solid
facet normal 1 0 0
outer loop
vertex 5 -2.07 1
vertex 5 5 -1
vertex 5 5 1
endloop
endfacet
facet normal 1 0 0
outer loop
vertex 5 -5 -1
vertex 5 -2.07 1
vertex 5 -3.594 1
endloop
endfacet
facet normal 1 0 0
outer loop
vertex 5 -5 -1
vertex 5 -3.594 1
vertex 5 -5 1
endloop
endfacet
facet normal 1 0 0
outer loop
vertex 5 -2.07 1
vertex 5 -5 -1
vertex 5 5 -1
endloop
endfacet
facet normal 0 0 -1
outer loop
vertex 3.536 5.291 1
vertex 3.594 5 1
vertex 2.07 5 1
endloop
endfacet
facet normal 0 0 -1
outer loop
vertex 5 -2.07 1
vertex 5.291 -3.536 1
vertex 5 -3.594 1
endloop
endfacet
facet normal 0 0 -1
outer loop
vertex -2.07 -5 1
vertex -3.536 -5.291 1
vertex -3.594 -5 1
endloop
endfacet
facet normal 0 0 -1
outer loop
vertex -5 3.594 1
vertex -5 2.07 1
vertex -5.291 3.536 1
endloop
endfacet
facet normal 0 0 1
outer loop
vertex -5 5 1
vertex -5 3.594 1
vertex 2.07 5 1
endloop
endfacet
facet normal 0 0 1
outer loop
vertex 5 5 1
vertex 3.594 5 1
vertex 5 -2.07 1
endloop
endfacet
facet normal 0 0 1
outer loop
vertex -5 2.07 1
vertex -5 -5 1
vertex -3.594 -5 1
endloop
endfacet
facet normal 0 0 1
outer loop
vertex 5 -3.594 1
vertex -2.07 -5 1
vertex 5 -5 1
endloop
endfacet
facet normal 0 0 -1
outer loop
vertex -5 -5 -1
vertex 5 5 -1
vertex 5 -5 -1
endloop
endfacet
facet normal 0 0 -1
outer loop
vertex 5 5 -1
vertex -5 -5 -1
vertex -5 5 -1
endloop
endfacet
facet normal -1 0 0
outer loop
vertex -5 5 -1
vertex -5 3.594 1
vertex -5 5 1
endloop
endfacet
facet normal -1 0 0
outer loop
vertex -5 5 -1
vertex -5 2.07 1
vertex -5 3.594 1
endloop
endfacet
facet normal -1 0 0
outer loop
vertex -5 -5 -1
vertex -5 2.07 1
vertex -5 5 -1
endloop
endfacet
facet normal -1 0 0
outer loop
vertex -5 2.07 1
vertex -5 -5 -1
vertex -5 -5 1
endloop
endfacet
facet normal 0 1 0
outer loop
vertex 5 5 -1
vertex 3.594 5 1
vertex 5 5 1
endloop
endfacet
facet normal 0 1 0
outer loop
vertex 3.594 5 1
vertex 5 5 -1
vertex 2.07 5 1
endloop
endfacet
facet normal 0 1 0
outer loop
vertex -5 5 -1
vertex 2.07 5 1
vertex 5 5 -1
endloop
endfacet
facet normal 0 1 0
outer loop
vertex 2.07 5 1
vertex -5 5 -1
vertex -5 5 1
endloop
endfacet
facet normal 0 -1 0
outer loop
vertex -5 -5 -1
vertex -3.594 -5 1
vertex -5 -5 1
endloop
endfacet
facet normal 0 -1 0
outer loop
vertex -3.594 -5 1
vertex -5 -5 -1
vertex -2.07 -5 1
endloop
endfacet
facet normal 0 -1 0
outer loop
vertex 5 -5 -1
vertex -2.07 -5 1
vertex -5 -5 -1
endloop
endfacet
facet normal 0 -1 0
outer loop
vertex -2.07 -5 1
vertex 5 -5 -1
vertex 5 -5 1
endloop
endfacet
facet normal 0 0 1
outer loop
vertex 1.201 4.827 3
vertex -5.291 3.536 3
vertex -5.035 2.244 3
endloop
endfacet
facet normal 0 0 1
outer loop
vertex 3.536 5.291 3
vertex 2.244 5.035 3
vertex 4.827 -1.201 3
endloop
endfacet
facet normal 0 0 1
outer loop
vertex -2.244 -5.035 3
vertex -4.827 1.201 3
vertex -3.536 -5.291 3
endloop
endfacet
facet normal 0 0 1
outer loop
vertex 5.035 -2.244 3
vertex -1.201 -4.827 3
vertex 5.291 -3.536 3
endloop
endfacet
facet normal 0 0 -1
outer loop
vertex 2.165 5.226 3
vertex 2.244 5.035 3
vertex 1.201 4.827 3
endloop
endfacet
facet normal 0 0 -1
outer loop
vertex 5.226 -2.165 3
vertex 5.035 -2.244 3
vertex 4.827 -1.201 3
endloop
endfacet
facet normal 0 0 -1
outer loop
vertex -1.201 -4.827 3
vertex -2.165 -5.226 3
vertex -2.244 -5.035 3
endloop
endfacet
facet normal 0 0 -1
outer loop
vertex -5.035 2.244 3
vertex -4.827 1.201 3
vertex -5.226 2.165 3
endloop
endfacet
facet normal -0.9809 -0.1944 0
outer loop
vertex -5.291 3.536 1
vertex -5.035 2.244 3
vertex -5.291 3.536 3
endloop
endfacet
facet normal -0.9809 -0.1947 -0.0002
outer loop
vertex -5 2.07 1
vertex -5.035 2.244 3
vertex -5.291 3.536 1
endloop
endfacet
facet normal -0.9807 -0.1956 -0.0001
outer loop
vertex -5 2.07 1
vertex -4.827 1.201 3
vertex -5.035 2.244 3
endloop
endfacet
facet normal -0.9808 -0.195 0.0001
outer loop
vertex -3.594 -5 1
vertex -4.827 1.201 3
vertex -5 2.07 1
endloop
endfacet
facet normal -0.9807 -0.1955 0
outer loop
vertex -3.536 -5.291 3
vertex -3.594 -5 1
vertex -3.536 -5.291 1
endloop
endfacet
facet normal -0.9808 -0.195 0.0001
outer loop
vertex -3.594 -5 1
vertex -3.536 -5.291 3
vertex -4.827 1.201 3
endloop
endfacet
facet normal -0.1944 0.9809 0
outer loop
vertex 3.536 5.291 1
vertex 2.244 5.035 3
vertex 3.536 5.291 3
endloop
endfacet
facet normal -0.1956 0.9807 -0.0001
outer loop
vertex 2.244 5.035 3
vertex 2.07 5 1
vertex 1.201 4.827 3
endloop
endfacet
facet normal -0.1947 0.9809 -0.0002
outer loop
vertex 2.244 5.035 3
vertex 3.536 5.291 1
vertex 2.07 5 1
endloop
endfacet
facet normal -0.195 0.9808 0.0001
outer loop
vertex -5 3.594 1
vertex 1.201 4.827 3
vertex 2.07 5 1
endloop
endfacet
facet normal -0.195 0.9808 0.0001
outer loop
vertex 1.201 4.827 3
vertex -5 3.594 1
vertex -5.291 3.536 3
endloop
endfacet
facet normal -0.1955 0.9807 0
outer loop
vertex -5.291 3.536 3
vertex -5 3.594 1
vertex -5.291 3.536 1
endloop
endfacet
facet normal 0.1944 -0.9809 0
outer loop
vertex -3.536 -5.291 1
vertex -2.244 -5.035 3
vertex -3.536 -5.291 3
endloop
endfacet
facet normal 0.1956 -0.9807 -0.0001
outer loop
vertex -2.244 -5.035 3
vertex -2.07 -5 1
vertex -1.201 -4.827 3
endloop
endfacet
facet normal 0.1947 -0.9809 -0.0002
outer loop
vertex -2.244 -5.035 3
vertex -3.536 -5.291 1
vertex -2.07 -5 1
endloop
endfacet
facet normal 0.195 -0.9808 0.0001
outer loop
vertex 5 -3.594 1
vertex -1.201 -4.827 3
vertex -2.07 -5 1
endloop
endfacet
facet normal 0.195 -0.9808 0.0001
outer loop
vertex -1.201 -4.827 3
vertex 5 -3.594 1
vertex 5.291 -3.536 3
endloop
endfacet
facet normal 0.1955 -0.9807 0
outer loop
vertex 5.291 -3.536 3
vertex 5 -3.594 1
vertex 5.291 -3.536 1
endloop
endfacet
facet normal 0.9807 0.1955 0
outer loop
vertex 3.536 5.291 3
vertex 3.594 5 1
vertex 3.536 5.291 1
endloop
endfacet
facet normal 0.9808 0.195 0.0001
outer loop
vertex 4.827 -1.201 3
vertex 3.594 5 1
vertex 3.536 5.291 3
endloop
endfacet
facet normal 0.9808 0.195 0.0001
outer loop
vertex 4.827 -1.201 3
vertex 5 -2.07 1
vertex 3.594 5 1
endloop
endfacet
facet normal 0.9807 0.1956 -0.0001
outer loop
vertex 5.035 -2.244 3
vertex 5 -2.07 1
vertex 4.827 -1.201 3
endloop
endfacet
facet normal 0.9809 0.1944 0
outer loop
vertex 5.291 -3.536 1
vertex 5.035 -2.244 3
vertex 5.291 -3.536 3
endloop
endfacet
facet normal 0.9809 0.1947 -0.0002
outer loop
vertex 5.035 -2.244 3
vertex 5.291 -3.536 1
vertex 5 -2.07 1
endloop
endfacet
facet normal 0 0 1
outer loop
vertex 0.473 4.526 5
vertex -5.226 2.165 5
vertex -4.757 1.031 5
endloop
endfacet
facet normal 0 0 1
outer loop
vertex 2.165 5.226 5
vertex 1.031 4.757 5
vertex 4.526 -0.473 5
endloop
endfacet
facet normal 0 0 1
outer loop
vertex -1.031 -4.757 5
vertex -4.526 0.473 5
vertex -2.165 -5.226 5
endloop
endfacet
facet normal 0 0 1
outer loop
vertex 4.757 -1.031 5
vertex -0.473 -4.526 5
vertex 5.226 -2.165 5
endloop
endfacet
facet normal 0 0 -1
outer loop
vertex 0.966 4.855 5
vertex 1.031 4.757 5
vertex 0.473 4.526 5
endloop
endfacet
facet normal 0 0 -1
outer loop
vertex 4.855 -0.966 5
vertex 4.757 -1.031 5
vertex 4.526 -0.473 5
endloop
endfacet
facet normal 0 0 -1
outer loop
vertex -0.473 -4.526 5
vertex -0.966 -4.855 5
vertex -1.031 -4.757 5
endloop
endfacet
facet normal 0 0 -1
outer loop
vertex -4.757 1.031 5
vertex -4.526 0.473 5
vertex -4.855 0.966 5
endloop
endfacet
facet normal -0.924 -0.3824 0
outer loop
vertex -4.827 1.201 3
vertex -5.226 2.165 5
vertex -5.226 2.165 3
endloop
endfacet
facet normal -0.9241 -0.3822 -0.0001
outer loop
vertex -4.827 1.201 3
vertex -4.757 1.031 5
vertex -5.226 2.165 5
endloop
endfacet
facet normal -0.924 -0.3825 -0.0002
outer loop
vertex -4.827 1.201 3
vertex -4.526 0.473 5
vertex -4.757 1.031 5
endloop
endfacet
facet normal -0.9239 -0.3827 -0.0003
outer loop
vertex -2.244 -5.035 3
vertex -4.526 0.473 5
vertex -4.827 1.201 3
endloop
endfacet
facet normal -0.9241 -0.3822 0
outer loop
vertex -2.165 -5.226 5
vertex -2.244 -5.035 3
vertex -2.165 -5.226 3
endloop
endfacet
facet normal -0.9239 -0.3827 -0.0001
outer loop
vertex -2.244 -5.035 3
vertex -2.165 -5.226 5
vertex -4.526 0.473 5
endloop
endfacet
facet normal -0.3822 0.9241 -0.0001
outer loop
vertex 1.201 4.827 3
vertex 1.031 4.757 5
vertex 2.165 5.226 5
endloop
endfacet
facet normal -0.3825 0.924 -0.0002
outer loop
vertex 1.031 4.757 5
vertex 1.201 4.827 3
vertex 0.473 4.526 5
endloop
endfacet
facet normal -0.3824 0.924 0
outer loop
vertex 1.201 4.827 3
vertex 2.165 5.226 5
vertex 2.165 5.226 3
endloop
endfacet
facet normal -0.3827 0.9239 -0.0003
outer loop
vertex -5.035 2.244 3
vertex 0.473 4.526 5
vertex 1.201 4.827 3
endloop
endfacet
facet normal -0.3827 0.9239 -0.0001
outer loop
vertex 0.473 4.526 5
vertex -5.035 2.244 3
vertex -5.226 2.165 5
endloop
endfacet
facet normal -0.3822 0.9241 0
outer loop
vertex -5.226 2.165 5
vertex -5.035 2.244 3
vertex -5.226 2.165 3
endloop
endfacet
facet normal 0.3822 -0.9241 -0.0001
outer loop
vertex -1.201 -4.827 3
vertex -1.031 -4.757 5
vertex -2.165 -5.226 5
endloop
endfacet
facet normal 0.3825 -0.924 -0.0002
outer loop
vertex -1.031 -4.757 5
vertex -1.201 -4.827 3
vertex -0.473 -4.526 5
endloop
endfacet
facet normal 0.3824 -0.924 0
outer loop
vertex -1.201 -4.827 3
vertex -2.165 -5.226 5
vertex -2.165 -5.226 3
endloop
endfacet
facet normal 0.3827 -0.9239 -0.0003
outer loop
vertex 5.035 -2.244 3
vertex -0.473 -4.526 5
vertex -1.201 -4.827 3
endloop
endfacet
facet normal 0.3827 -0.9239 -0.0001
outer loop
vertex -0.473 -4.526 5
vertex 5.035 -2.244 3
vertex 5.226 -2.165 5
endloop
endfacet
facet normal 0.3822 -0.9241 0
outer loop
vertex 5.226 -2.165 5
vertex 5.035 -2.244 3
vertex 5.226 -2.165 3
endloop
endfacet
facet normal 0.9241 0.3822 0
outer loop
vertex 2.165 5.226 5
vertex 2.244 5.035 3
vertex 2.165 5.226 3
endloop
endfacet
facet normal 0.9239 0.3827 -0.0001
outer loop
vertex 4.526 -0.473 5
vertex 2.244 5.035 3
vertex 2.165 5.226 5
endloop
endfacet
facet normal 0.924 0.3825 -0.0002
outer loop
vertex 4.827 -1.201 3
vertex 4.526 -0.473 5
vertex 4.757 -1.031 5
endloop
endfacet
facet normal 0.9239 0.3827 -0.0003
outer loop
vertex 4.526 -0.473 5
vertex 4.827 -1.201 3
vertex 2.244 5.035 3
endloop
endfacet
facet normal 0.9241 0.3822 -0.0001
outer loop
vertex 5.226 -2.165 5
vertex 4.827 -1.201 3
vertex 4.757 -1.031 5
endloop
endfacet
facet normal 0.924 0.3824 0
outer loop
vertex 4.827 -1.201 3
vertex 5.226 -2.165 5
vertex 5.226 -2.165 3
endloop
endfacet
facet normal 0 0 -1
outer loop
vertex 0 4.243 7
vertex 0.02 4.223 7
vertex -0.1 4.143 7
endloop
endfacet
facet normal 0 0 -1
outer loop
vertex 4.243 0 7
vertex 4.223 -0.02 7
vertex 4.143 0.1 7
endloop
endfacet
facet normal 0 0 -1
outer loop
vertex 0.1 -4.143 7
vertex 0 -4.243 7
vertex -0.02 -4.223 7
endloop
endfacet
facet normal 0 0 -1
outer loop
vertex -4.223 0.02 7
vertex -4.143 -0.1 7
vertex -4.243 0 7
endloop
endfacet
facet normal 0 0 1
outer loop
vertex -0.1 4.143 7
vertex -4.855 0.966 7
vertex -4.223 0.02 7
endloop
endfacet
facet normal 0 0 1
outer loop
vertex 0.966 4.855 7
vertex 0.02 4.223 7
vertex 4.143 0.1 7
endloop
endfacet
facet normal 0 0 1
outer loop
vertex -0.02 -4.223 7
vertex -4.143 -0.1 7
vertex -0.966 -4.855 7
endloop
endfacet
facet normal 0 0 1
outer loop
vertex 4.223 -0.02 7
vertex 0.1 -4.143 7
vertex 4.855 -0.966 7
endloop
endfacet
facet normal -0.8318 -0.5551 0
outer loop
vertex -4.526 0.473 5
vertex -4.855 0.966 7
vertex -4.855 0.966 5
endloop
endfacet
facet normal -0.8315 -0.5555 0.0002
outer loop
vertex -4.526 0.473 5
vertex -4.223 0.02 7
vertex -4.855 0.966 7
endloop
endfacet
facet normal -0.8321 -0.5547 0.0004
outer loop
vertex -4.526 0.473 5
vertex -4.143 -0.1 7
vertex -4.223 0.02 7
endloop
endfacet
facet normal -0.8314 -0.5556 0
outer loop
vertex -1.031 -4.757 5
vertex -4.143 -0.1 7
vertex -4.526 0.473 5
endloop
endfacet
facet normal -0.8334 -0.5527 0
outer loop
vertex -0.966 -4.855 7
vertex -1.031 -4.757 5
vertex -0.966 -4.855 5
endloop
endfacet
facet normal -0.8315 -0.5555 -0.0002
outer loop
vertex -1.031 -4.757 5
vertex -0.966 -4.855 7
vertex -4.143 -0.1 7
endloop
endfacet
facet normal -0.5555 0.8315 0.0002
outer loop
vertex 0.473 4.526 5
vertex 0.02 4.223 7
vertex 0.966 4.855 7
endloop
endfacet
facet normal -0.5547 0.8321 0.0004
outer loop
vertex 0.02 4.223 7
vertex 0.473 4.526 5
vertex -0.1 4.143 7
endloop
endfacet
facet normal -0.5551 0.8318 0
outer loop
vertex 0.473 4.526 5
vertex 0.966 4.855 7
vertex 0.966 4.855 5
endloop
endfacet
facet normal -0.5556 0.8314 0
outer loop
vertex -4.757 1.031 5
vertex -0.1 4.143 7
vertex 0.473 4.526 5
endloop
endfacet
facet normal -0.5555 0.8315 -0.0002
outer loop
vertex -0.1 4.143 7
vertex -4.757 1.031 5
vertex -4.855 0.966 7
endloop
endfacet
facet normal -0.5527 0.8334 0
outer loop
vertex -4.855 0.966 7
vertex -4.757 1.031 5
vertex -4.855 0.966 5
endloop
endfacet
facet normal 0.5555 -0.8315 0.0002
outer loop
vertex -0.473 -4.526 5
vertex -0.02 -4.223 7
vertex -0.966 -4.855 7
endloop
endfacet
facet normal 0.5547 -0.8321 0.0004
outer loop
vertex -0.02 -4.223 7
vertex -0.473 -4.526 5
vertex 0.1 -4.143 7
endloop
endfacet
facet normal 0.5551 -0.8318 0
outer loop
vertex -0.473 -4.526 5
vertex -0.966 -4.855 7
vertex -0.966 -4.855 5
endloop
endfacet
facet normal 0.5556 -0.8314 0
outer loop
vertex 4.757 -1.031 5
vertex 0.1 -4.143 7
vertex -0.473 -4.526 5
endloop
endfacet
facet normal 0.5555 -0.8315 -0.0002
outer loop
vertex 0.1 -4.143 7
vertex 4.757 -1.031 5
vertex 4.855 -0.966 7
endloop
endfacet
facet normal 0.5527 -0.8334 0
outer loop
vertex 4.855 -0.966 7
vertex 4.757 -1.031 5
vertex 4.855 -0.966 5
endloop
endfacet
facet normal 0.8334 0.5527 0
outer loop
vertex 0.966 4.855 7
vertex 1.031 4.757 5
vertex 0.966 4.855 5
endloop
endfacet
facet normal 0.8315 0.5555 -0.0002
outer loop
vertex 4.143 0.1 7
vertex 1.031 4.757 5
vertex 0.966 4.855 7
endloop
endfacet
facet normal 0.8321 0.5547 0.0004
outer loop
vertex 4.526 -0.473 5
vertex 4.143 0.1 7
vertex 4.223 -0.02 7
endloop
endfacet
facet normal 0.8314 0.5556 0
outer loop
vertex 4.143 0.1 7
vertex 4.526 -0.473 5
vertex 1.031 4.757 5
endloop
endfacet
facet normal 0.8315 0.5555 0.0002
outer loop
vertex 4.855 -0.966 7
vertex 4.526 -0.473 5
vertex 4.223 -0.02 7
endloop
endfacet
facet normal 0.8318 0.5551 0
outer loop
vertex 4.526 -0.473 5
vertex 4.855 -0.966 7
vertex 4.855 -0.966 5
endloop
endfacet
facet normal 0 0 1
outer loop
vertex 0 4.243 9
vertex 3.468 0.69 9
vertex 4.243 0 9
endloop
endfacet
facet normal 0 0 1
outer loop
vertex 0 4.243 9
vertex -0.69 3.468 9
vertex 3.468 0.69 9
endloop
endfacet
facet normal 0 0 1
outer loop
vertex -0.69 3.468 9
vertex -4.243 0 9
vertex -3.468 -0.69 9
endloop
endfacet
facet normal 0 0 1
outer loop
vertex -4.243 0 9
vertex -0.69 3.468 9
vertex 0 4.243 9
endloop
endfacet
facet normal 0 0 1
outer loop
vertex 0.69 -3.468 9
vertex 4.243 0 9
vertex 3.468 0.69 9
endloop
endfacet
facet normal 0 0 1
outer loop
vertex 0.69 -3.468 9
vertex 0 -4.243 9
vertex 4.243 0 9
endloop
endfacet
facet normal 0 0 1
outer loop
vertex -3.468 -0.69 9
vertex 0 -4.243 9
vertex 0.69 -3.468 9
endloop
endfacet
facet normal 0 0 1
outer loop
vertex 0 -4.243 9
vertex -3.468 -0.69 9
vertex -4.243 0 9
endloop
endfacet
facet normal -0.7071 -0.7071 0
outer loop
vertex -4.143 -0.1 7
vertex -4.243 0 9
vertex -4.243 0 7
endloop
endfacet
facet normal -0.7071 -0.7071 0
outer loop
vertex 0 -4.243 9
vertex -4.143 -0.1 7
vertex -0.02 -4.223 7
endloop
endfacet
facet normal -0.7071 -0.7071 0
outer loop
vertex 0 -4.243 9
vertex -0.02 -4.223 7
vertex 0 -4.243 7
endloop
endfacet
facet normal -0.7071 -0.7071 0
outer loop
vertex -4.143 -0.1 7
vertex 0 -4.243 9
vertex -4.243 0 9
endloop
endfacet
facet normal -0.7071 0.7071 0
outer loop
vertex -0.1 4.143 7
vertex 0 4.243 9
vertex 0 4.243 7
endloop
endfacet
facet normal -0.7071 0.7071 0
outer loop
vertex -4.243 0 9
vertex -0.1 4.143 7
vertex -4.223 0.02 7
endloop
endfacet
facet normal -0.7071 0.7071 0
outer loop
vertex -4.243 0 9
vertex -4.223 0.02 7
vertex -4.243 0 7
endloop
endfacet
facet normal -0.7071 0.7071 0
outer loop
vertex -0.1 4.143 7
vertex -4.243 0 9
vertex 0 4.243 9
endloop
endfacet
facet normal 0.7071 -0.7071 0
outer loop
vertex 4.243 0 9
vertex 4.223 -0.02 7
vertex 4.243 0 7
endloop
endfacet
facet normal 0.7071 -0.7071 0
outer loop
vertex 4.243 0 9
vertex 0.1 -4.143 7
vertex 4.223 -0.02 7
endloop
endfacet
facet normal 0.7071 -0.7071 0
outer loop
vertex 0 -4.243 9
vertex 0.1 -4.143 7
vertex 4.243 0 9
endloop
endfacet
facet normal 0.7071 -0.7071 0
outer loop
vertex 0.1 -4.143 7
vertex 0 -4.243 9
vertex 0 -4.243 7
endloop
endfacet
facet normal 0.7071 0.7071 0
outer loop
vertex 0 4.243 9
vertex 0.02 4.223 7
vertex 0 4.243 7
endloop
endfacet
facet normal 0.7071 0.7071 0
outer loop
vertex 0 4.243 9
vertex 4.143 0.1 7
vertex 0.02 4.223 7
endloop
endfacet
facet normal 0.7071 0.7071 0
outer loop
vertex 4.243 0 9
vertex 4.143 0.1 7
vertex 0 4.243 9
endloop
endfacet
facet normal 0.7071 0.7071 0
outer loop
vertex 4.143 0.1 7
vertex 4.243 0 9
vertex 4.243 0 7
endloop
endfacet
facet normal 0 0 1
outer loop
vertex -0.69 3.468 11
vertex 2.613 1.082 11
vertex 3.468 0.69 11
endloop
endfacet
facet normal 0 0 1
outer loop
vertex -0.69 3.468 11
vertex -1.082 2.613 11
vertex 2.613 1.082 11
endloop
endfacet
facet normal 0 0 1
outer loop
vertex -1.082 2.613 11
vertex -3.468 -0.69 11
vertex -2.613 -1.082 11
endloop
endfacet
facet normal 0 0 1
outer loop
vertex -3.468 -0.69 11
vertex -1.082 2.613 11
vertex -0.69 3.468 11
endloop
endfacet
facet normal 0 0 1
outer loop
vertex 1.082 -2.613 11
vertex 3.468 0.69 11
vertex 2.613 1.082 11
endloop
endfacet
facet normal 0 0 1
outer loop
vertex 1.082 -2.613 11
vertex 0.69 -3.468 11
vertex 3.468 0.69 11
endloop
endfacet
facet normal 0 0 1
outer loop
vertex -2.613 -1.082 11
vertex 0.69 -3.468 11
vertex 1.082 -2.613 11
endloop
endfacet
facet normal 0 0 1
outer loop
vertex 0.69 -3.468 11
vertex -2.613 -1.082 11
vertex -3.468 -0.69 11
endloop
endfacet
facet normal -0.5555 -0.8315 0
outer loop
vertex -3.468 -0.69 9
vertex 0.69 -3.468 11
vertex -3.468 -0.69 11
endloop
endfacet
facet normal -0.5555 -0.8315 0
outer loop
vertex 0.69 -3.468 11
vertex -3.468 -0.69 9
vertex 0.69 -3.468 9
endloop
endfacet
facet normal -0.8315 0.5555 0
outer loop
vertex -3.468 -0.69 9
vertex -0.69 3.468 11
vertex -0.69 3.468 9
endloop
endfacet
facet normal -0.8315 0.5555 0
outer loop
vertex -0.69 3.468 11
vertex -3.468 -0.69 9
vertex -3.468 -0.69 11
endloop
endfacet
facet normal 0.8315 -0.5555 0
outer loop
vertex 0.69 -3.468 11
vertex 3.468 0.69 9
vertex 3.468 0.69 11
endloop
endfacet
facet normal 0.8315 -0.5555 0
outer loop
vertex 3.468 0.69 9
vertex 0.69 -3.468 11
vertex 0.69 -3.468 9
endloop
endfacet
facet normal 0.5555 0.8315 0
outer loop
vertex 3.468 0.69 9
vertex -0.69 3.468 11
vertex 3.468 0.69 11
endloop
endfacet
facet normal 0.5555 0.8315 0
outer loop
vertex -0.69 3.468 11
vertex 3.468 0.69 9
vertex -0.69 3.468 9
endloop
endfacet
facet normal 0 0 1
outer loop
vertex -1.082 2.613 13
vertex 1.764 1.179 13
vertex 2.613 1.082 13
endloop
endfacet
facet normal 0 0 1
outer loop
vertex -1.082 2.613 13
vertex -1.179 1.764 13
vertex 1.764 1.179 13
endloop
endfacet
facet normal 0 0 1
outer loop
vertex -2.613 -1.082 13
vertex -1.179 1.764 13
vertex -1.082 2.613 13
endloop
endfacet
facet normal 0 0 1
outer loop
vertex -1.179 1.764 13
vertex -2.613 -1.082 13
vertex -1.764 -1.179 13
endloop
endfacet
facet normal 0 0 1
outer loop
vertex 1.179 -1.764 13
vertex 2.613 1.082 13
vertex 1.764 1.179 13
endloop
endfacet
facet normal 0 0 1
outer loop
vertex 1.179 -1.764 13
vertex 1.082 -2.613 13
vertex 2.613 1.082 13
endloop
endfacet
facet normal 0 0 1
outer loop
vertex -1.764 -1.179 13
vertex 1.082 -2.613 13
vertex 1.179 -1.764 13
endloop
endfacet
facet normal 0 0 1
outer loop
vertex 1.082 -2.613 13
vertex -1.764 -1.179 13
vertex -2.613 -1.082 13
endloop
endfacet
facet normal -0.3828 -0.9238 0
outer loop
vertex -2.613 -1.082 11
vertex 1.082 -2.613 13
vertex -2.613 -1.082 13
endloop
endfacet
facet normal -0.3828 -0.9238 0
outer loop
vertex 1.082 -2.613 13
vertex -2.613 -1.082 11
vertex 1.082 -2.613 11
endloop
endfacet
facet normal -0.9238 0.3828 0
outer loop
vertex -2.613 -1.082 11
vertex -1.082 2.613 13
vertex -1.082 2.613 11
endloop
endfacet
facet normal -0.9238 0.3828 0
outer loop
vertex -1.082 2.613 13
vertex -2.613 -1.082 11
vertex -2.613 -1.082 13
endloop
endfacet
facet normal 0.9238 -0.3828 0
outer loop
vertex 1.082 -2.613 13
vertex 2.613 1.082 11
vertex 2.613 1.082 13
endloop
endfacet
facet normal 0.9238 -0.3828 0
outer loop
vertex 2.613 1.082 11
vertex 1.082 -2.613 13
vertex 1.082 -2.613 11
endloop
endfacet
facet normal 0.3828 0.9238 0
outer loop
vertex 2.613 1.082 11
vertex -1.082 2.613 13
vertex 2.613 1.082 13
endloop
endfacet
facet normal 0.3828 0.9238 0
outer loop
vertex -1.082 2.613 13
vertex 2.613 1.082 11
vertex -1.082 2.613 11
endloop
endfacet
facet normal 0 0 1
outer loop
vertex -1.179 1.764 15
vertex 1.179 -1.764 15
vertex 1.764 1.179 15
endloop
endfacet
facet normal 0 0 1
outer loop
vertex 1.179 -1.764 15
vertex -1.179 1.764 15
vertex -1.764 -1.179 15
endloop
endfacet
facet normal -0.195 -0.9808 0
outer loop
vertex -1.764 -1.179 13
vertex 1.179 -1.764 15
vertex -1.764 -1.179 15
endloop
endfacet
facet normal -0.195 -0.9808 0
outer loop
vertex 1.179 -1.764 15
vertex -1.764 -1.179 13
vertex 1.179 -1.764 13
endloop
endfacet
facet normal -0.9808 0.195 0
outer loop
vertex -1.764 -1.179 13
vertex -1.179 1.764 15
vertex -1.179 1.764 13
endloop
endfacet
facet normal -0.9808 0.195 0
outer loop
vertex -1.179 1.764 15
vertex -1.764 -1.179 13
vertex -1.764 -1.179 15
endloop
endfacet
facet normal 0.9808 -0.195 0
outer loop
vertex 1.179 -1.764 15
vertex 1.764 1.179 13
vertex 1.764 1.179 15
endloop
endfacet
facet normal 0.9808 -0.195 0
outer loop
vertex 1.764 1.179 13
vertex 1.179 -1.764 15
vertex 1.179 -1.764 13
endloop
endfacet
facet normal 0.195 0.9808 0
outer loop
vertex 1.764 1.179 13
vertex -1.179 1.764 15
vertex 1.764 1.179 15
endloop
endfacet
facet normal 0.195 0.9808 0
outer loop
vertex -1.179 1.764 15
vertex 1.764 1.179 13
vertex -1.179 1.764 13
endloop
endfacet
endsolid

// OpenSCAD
// Stacked rotated slabs using for, rotate and color.
n = 8;
for (i = [0:n - 1])
  color([i / n, 0.5, 1 - i / n])
    translate([0, 0, i * 2])
      rotate(i * 360 / n / 4)
        cube([10 - i, 10 - i, 2], center = true);
